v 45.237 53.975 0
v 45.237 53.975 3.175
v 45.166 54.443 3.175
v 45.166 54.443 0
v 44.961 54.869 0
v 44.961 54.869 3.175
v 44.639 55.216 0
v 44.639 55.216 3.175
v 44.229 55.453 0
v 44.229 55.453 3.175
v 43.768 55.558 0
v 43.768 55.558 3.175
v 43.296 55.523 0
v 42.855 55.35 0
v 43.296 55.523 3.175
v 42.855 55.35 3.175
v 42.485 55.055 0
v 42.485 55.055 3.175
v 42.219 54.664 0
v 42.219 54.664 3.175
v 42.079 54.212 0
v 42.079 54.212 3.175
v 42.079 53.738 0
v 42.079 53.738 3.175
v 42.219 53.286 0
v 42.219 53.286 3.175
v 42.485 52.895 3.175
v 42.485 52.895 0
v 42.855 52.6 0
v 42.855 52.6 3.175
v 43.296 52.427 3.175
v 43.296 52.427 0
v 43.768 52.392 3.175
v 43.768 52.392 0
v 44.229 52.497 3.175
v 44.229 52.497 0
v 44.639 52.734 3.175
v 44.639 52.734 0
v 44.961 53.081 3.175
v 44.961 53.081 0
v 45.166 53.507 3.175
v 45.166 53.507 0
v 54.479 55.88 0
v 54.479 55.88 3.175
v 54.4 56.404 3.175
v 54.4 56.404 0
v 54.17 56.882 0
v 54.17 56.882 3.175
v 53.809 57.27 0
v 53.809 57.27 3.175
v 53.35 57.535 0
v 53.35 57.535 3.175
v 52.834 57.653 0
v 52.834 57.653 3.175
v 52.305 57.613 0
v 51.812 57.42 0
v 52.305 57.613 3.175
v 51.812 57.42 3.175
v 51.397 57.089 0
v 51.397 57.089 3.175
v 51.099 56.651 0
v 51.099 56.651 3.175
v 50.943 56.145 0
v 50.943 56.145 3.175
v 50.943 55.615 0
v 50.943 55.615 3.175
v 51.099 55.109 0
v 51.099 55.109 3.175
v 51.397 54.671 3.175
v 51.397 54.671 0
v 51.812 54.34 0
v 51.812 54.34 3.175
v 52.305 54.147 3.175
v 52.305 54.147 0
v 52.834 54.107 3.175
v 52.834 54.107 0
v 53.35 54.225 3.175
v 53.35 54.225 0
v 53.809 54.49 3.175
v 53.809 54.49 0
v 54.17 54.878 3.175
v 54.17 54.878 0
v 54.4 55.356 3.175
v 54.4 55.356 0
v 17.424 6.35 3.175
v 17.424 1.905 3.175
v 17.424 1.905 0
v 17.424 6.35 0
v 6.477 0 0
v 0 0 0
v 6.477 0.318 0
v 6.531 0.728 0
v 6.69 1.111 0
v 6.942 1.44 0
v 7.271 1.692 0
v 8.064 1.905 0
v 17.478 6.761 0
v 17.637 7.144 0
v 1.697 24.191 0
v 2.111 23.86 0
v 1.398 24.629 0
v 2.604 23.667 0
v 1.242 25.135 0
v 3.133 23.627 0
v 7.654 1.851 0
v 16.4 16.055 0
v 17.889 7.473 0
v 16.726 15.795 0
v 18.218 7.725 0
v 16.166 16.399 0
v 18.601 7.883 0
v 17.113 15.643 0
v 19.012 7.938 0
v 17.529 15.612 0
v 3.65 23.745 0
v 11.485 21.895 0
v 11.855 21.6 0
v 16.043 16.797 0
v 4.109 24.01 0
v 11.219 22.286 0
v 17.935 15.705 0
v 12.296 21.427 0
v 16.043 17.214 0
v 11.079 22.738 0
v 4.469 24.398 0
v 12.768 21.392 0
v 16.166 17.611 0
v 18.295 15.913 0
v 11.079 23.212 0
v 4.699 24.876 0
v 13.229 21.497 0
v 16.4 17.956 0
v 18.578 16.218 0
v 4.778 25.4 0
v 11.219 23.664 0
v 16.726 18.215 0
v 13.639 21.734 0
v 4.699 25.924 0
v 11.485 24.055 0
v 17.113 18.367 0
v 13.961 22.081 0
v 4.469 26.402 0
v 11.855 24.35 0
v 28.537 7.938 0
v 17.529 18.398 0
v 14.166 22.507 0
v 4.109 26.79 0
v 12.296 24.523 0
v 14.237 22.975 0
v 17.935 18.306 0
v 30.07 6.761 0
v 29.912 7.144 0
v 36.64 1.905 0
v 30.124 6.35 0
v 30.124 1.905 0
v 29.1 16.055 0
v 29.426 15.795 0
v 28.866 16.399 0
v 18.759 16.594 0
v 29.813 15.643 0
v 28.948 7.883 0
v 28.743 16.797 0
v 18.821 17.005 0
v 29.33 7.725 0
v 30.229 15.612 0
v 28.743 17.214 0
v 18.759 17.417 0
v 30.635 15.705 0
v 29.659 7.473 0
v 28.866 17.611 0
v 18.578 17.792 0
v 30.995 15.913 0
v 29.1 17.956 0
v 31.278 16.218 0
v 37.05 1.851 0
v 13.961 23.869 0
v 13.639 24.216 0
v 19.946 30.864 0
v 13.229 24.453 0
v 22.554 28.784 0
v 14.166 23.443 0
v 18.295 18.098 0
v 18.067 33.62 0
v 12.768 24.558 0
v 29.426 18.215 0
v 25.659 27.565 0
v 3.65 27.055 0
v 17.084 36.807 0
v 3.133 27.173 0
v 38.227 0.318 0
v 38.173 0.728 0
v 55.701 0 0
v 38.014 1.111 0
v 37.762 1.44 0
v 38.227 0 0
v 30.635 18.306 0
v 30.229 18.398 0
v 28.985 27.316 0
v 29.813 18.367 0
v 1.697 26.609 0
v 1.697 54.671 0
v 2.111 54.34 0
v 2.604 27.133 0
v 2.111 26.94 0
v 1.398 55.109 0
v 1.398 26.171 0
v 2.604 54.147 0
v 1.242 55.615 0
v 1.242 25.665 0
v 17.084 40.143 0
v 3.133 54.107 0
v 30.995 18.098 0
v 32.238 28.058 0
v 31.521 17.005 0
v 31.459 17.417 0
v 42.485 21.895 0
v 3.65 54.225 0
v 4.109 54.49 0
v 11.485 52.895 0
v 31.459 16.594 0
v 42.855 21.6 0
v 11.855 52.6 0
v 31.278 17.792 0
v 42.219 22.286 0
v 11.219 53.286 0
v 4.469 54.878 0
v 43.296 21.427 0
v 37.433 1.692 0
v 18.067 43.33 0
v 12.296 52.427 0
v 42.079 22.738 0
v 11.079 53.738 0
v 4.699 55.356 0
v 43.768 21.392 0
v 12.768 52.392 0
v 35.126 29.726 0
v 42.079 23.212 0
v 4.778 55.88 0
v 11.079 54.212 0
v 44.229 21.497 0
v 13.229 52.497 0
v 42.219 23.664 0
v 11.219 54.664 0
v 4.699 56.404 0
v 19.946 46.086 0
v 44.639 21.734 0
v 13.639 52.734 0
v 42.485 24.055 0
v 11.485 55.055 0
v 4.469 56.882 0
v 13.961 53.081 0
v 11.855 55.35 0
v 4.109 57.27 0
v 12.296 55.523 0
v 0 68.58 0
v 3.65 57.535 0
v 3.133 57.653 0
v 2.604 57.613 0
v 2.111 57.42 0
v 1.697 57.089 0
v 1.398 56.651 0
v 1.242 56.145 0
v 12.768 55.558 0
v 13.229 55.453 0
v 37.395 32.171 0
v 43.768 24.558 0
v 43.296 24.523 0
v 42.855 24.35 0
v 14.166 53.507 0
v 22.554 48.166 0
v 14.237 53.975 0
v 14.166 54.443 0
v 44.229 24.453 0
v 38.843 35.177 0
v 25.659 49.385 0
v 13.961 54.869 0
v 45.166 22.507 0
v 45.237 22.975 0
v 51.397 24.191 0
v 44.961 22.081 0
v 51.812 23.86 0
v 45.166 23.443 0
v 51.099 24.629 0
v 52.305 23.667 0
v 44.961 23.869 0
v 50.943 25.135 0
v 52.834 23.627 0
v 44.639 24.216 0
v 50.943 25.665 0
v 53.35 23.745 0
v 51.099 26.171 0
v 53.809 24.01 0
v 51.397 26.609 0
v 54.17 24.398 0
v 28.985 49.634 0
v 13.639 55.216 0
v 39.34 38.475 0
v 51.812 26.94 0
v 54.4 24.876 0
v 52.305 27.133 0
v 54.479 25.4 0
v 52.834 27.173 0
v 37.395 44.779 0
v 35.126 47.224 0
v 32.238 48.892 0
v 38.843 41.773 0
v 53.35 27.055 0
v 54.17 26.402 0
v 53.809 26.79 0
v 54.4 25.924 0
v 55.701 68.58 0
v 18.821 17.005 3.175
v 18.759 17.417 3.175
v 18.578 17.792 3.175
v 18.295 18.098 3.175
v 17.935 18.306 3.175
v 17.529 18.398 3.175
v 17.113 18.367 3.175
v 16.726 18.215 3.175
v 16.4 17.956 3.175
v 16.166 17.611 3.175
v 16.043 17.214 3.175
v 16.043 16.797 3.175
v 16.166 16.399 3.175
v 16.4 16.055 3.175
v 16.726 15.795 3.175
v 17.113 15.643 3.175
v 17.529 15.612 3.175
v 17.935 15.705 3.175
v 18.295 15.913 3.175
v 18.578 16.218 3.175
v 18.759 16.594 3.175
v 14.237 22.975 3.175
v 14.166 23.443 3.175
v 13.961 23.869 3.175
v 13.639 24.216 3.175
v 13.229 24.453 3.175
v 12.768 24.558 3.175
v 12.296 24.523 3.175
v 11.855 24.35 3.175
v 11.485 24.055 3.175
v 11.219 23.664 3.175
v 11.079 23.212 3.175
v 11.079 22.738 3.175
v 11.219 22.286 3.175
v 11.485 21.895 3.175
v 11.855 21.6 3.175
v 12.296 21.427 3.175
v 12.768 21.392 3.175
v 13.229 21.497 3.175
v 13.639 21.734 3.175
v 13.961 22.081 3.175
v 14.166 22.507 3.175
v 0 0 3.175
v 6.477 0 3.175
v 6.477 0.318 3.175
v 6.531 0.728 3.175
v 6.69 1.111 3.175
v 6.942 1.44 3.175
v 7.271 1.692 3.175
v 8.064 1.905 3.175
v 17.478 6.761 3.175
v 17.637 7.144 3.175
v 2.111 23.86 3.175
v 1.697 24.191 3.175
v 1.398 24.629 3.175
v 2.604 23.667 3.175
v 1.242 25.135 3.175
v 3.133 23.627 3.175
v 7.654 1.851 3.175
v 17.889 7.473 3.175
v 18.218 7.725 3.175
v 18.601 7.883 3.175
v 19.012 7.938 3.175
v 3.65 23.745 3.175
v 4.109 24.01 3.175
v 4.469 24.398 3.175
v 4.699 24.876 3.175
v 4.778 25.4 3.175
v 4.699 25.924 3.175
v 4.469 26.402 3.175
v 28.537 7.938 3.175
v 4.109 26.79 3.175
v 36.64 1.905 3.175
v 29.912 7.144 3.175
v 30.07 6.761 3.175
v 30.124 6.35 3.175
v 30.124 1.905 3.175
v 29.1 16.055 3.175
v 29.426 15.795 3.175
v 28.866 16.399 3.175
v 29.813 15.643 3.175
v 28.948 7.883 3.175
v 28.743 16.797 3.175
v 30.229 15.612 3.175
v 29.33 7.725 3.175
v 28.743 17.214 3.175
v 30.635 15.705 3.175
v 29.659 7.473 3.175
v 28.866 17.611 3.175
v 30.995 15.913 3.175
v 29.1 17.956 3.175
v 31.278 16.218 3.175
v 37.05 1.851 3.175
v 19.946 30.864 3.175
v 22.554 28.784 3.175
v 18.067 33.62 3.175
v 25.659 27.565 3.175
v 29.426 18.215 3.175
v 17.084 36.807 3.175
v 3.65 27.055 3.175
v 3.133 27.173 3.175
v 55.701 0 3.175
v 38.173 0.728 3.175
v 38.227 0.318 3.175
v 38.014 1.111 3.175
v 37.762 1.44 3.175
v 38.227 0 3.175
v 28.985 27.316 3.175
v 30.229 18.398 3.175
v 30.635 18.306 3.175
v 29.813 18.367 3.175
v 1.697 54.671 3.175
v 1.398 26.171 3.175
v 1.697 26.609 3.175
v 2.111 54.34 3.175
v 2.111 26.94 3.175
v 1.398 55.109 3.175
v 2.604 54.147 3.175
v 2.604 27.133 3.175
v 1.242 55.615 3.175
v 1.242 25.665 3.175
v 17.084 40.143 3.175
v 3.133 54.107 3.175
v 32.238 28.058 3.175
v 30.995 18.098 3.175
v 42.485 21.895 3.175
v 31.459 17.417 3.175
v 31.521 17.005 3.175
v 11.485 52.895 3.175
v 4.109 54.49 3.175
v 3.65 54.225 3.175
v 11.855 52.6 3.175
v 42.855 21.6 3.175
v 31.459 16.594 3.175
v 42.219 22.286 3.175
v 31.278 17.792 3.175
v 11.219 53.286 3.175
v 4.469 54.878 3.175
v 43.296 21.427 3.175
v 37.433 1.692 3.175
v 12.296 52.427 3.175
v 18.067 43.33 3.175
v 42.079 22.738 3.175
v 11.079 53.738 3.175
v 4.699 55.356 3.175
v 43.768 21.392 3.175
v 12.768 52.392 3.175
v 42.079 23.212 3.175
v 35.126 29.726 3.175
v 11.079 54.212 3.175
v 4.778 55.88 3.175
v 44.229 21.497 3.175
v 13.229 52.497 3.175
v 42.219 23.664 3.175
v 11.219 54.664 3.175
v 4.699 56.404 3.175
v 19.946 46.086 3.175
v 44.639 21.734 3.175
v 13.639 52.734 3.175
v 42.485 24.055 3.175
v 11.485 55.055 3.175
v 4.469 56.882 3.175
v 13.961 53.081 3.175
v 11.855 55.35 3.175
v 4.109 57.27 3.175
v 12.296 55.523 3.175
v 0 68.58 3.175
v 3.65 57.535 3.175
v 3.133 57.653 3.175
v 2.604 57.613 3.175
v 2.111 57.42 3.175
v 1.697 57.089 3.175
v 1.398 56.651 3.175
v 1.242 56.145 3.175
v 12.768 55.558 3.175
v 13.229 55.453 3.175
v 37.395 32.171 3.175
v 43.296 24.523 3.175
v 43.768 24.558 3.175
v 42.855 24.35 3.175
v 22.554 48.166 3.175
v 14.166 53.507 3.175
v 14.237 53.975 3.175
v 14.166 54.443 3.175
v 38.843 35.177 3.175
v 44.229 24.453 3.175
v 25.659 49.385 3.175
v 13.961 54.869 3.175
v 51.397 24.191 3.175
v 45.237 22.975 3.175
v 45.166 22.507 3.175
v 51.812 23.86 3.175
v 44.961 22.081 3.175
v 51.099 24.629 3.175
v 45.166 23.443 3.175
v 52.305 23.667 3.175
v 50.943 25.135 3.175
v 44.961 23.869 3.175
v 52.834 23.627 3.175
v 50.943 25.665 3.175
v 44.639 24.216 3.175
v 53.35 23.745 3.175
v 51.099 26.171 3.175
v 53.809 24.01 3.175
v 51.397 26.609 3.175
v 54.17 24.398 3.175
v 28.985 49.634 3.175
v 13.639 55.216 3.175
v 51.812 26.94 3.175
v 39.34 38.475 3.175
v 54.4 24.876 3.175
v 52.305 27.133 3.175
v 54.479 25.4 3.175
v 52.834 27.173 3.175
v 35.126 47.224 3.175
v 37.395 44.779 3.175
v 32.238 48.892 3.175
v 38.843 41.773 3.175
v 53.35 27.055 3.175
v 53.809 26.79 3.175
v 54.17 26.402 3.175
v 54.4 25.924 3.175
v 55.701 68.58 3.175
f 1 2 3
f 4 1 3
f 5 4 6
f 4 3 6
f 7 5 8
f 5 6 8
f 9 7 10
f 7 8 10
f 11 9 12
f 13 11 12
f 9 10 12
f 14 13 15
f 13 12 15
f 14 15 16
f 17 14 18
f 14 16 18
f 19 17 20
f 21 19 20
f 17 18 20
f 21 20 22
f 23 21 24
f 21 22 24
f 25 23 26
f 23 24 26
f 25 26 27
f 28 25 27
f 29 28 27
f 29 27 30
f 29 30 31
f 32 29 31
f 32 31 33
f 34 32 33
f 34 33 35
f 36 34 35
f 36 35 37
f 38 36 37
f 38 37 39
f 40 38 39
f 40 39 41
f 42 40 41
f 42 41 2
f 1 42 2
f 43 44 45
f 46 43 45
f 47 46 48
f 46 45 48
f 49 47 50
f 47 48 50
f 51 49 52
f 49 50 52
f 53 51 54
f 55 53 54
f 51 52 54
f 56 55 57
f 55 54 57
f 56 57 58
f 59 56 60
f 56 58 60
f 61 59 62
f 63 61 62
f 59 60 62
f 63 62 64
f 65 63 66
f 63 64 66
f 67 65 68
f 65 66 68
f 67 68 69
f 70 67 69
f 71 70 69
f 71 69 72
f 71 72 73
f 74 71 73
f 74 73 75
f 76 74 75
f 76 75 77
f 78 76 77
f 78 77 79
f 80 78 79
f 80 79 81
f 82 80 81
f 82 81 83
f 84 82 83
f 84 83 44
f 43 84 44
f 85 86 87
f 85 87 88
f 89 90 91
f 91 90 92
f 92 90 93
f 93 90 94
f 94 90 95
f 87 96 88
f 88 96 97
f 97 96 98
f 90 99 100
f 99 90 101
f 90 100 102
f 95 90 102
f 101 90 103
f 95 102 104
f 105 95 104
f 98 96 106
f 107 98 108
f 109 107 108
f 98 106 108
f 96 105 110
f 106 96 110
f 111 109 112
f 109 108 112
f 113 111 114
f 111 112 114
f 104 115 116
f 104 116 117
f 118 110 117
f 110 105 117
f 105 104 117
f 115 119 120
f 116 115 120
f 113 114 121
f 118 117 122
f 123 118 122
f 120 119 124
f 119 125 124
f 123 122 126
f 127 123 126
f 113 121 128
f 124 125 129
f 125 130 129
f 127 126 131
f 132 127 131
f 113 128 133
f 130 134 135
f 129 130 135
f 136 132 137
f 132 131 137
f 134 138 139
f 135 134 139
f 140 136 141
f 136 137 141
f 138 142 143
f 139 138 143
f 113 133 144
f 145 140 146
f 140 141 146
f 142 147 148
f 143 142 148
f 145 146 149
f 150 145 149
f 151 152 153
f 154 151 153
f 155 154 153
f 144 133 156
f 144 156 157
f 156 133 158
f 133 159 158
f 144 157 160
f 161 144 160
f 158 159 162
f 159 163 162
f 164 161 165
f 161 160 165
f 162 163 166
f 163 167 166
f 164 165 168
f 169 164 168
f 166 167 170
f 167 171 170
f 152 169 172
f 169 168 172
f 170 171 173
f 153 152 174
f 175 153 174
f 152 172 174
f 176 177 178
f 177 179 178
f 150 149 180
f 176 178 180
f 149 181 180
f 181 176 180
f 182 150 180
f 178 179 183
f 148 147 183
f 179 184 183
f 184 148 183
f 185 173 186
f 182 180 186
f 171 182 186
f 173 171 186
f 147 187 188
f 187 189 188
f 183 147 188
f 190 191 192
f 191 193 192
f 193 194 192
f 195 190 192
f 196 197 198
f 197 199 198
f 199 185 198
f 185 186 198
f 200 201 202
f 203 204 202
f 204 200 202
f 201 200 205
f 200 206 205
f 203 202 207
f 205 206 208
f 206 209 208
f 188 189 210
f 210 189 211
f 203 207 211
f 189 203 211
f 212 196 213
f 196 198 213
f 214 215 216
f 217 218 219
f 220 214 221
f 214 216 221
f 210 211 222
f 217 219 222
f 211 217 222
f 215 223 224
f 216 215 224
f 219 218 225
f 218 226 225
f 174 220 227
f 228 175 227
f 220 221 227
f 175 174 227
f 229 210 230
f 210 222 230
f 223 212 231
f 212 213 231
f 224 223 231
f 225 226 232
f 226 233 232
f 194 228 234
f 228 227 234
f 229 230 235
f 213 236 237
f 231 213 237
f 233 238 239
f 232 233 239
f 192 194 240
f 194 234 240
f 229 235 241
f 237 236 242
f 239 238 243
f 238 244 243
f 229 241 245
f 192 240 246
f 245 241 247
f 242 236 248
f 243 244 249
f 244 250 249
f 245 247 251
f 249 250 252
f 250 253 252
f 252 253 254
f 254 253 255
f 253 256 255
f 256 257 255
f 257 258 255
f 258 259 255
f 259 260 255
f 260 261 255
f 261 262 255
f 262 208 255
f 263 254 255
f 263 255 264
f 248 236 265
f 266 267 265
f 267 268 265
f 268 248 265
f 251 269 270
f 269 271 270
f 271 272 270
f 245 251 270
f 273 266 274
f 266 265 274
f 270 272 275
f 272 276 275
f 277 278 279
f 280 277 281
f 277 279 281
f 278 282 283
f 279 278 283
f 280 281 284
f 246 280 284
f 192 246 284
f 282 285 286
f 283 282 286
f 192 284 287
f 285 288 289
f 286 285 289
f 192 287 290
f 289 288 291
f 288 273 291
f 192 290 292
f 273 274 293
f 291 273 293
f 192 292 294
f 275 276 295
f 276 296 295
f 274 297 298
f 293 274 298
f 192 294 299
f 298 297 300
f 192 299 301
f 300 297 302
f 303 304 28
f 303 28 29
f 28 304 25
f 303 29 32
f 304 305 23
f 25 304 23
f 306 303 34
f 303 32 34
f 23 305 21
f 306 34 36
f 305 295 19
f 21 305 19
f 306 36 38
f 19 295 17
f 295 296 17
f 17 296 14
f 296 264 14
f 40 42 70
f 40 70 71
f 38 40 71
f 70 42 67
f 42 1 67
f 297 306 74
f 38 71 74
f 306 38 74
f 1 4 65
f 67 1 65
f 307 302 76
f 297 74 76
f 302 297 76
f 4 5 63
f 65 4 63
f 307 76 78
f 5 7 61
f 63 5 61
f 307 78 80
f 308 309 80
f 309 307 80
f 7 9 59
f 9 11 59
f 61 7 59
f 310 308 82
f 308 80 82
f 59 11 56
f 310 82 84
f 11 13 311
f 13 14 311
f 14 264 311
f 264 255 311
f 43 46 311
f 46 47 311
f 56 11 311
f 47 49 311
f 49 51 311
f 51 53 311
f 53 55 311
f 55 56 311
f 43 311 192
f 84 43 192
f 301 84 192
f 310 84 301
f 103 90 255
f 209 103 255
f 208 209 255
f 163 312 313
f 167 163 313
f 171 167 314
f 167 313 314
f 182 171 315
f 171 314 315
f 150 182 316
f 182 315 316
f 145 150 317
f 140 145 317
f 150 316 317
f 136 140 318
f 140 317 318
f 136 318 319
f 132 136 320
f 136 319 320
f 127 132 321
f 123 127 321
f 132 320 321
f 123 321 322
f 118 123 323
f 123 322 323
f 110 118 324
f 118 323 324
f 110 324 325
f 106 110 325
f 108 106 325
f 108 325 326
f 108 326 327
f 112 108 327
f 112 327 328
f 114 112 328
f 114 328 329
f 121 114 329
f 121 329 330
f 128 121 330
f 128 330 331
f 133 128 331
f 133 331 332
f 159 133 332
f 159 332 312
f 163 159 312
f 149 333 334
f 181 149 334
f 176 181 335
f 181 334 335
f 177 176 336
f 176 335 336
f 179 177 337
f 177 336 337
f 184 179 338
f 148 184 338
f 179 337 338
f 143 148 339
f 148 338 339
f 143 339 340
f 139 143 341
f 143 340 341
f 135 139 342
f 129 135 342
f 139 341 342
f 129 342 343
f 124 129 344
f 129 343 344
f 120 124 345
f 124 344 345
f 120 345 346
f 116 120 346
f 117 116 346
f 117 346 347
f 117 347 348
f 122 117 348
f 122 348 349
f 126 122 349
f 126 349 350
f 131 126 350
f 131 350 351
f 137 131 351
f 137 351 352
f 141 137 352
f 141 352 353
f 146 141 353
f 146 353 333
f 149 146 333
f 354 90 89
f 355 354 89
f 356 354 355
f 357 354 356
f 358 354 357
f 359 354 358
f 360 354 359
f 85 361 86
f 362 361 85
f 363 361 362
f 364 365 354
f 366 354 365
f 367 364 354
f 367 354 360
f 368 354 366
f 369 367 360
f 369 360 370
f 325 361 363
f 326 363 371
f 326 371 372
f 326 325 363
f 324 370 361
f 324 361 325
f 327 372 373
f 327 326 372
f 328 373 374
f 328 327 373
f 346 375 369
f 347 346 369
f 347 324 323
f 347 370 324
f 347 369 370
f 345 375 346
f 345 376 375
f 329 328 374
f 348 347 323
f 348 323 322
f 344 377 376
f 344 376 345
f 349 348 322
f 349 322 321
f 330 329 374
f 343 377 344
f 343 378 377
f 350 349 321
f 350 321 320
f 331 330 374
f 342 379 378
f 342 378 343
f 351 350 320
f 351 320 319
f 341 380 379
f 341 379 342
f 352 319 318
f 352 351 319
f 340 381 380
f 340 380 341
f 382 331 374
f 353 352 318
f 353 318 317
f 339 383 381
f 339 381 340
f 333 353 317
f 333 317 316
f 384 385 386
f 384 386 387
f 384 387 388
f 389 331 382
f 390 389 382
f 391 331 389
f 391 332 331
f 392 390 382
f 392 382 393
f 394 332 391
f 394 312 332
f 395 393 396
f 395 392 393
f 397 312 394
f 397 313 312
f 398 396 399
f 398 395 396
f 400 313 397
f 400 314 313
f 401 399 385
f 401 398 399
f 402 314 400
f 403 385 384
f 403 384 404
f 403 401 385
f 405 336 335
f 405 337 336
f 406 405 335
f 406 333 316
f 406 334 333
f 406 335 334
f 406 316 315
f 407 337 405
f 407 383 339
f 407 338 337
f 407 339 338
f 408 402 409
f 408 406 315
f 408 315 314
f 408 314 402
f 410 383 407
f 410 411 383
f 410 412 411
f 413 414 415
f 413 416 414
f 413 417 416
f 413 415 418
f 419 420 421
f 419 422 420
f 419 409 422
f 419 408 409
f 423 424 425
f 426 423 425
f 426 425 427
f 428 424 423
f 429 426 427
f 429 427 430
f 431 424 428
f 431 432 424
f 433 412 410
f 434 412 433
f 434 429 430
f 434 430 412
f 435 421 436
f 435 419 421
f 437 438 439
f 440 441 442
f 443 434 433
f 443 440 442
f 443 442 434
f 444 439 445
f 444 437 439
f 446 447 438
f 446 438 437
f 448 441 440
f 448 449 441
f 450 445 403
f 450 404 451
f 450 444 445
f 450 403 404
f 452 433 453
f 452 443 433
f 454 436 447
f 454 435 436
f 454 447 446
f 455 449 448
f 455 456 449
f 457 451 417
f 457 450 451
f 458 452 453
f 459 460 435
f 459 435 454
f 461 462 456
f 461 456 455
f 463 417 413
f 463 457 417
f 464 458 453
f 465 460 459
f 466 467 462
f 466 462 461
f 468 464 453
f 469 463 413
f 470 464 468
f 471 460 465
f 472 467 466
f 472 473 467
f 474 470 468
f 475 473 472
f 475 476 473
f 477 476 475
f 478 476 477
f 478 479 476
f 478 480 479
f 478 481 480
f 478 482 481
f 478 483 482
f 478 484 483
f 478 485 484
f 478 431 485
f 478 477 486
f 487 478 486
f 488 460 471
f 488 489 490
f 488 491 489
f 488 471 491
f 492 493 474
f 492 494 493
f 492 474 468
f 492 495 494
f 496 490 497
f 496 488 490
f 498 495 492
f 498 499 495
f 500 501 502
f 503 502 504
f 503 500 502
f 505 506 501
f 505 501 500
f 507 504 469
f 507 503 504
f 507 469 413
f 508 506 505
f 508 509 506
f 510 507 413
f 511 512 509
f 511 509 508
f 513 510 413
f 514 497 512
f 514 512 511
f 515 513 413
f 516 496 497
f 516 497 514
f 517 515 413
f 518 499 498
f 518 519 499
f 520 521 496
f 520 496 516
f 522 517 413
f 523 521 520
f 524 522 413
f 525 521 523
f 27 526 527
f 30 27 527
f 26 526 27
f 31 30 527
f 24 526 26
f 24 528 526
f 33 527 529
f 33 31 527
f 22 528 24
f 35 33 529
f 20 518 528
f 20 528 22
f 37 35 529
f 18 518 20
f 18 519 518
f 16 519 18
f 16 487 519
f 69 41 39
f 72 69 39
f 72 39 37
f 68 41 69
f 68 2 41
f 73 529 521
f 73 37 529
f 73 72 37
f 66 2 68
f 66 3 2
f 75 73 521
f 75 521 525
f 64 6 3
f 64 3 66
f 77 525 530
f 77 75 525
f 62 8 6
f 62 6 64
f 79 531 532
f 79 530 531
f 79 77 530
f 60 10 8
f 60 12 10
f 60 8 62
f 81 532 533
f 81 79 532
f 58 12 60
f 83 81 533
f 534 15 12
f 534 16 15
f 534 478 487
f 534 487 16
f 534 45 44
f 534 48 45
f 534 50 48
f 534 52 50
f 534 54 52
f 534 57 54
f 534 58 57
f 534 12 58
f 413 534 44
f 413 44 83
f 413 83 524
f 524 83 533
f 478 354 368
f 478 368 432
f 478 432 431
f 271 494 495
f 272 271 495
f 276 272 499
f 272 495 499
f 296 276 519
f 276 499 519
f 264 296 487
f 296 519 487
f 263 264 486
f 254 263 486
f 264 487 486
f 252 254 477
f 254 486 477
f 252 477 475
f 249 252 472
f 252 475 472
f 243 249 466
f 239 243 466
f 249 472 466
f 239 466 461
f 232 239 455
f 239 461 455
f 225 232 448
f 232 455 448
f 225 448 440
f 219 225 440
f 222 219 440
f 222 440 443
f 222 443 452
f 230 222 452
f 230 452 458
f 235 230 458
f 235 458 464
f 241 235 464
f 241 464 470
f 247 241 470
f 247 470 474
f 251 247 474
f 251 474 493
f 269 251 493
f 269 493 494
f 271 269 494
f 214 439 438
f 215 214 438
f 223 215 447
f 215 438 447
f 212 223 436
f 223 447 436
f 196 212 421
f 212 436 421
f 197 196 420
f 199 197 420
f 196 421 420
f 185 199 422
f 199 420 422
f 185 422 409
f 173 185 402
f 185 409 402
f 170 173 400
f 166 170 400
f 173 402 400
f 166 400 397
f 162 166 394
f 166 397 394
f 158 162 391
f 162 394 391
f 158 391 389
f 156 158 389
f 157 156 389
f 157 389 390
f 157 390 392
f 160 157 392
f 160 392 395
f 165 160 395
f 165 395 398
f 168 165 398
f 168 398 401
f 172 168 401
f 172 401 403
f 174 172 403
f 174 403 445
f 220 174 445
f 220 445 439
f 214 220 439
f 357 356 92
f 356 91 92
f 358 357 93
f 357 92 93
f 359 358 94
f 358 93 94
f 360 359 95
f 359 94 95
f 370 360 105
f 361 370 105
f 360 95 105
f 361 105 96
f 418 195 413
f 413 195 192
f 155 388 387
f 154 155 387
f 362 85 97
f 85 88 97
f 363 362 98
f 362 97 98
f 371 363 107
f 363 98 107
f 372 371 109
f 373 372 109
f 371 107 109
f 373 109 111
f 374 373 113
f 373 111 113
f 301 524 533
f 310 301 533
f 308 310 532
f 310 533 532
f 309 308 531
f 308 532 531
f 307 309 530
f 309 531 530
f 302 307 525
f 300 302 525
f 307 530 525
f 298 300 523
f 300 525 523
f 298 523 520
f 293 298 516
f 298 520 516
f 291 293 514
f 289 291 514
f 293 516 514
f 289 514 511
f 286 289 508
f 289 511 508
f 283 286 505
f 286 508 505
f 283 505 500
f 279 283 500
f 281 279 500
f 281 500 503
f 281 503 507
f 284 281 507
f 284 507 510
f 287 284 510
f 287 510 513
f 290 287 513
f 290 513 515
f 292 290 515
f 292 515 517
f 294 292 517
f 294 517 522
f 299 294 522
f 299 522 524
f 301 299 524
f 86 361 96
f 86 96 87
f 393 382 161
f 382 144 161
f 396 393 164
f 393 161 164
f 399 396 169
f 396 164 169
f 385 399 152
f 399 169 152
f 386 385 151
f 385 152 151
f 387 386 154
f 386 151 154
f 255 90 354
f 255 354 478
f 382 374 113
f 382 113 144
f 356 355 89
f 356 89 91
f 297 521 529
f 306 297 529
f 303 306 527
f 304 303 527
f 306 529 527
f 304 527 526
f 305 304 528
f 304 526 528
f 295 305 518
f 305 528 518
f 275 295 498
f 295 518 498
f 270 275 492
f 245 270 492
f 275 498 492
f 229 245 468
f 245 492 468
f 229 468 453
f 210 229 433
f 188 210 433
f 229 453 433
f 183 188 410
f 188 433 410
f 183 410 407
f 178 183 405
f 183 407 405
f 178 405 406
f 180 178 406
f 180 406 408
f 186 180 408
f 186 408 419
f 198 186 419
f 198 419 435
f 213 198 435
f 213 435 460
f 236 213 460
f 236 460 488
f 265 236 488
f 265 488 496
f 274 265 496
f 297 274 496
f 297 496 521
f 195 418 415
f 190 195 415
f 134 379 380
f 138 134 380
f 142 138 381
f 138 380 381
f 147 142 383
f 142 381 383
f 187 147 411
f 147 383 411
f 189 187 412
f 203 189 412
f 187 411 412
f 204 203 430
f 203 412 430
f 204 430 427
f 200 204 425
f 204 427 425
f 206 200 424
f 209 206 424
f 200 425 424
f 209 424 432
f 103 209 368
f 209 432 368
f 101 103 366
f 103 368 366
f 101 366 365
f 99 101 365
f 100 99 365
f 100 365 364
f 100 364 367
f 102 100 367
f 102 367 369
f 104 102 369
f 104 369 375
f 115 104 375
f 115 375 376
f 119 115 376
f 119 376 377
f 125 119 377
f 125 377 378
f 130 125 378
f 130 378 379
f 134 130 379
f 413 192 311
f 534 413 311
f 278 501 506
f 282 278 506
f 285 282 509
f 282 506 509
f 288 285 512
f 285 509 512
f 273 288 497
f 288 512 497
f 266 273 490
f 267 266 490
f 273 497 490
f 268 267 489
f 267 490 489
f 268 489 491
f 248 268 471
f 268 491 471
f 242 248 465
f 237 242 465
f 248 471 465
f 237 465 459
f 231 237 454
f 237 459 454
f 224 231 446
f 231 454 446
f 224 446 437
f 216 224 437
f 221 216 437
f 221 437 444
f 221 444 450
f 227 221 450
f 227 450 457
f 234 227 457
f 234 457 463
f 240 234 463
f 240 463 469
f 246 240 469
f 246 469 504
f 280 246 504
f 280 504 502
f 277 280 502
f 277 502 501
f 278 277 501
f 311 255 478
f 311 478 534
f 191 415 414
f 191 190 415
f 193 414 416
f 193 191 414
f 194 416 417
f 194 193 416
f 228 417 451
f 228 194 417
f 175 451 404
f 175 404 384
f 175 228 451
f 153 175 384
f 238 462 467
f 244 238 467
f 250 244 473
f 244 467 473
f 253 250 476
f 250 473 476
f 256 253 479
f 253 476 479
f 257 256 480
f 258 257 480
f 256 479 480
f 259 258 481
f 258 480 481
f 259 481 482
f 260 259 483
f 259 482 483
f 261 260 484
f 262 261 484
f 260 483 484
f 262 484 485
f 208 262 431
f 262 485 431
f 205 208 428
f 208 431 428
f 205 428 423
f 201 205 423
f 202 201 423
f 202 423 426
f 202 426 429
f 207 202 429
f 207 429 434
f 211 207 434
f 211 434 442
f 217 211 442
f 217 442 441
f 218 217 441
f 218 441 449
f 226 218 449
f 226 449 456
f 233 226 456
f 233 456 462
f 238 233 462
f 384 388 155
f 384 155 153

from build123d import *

# Parameters (mm, degrees)
SKETCH1_W           = 55.700676
SKETCH1_H           = 68.58
BOSS_EXTRUDE1_DEPTH = 3.175
SKETCH2_R           = 11.190499971
SKETCH2_R_2         = 1.5875
SKETCH2_R_3         = 1.397
SKETCH2_W           = 12.7
SKETCH2_H           = 7.9375
CUT_EXTRUDE1_DEPTH  = 89.407365824
SKETCH3_W           = 31.75
SKETCH3_H           = 1.905
CUT_EXTRUDE2_DEPTH  = 89.407365824
SKETCH4_R           = 1.778
CUT_EXTRUDE3_DEPTH  = 89.407365824
FILLET1_R           = 1.5875


with BuildPart() as part:
    # Sketch1 → Boss-Extrude1 (new body)
    with BuildSketch(Plane.XY):
        with Locations((27.850338, 34.29)):
            Rectangle(SKETCH1_W, SKETCH1_H)
    extrude(amount=BOSS_EXTRUDE1_DEPTH)

    # Sketch2 → Cut-Extrude1 (cut, through all)
    with BuildSketch(Plane.XY.offset(3.175)):
        with Locations((28.1492, 38.475)):
            Circle(SKETCH2_R)
        with Locations((12.6492, 53.975)):
            Circle(SKETCH2_R_2)
        with Locations((43.6492, 53.975)):
            Circle(SKETCH2_R_2)
        with Locations((43.6492, 22.975)):
            Circle(SKETCH2_R_2)
        with Locations((12.6492, 22.975)):
            Circle(SKETCH2_R_2)
        with Locations((17.4242, 17.005299976)):
            Circle(SKETCH2_R_3)
        with Locations((30.1242, 17.005299976)):
            Circle(SKETCH2_R_3)
        with Locations((23.7742, 3.96875)):
            Rectangle(SKETCH2_W, SKETCH2_H)
    extrude(amount=-CUT_EXTRUDE1_DEPTH, mode=Mode.SUBTRACT)

    # Sketch3 → Cut-Extrude2 (cut, through all)
    with BuildSketch(Plane.XY.offset(3.175)):
        with Locations((22.352, 0.9525)):
            Rectangle(SKETCH3_W, SKETCH3_H)
    extrude(amount=-CUT_EXTRUDE2_DEPTH, mode=Mode.SUBTRACT)

    # Sketch4 → Cut-Extrude3 (cut, through all)
    with BuildSketch(Plane.XY.offset(3.175)):
        with Locations((3, 55.88)):
            Circle(SKETCH4_R)
        with Locations((3, 25.4)):
            Circle(SKETCH4_R)
        with Locations((52.700676, 25.4)):
            Circle(SKETCH4_R)
        with Locations((52.700676, 55.88)):
            Circle(SKETCH4_R)
    extrude(amount=-CUT_EXTRUDE3_DEPTH, mode=Mode.SUBTRACT)

    # Fillet1
    fillet1_edges = [part.edges().sort_by_distance(p)[0] for p in [
        (17.4242, 7.9375, 1.5875),
        (30.1242, 7.9375, 1.5875),
        (6.477, 1.905, 1.5875),
        (38.227, 1.905, 1.5875),
    ]]
    fillet(fillet1_edges, radius=FILLET1_R)


solid = part.part
